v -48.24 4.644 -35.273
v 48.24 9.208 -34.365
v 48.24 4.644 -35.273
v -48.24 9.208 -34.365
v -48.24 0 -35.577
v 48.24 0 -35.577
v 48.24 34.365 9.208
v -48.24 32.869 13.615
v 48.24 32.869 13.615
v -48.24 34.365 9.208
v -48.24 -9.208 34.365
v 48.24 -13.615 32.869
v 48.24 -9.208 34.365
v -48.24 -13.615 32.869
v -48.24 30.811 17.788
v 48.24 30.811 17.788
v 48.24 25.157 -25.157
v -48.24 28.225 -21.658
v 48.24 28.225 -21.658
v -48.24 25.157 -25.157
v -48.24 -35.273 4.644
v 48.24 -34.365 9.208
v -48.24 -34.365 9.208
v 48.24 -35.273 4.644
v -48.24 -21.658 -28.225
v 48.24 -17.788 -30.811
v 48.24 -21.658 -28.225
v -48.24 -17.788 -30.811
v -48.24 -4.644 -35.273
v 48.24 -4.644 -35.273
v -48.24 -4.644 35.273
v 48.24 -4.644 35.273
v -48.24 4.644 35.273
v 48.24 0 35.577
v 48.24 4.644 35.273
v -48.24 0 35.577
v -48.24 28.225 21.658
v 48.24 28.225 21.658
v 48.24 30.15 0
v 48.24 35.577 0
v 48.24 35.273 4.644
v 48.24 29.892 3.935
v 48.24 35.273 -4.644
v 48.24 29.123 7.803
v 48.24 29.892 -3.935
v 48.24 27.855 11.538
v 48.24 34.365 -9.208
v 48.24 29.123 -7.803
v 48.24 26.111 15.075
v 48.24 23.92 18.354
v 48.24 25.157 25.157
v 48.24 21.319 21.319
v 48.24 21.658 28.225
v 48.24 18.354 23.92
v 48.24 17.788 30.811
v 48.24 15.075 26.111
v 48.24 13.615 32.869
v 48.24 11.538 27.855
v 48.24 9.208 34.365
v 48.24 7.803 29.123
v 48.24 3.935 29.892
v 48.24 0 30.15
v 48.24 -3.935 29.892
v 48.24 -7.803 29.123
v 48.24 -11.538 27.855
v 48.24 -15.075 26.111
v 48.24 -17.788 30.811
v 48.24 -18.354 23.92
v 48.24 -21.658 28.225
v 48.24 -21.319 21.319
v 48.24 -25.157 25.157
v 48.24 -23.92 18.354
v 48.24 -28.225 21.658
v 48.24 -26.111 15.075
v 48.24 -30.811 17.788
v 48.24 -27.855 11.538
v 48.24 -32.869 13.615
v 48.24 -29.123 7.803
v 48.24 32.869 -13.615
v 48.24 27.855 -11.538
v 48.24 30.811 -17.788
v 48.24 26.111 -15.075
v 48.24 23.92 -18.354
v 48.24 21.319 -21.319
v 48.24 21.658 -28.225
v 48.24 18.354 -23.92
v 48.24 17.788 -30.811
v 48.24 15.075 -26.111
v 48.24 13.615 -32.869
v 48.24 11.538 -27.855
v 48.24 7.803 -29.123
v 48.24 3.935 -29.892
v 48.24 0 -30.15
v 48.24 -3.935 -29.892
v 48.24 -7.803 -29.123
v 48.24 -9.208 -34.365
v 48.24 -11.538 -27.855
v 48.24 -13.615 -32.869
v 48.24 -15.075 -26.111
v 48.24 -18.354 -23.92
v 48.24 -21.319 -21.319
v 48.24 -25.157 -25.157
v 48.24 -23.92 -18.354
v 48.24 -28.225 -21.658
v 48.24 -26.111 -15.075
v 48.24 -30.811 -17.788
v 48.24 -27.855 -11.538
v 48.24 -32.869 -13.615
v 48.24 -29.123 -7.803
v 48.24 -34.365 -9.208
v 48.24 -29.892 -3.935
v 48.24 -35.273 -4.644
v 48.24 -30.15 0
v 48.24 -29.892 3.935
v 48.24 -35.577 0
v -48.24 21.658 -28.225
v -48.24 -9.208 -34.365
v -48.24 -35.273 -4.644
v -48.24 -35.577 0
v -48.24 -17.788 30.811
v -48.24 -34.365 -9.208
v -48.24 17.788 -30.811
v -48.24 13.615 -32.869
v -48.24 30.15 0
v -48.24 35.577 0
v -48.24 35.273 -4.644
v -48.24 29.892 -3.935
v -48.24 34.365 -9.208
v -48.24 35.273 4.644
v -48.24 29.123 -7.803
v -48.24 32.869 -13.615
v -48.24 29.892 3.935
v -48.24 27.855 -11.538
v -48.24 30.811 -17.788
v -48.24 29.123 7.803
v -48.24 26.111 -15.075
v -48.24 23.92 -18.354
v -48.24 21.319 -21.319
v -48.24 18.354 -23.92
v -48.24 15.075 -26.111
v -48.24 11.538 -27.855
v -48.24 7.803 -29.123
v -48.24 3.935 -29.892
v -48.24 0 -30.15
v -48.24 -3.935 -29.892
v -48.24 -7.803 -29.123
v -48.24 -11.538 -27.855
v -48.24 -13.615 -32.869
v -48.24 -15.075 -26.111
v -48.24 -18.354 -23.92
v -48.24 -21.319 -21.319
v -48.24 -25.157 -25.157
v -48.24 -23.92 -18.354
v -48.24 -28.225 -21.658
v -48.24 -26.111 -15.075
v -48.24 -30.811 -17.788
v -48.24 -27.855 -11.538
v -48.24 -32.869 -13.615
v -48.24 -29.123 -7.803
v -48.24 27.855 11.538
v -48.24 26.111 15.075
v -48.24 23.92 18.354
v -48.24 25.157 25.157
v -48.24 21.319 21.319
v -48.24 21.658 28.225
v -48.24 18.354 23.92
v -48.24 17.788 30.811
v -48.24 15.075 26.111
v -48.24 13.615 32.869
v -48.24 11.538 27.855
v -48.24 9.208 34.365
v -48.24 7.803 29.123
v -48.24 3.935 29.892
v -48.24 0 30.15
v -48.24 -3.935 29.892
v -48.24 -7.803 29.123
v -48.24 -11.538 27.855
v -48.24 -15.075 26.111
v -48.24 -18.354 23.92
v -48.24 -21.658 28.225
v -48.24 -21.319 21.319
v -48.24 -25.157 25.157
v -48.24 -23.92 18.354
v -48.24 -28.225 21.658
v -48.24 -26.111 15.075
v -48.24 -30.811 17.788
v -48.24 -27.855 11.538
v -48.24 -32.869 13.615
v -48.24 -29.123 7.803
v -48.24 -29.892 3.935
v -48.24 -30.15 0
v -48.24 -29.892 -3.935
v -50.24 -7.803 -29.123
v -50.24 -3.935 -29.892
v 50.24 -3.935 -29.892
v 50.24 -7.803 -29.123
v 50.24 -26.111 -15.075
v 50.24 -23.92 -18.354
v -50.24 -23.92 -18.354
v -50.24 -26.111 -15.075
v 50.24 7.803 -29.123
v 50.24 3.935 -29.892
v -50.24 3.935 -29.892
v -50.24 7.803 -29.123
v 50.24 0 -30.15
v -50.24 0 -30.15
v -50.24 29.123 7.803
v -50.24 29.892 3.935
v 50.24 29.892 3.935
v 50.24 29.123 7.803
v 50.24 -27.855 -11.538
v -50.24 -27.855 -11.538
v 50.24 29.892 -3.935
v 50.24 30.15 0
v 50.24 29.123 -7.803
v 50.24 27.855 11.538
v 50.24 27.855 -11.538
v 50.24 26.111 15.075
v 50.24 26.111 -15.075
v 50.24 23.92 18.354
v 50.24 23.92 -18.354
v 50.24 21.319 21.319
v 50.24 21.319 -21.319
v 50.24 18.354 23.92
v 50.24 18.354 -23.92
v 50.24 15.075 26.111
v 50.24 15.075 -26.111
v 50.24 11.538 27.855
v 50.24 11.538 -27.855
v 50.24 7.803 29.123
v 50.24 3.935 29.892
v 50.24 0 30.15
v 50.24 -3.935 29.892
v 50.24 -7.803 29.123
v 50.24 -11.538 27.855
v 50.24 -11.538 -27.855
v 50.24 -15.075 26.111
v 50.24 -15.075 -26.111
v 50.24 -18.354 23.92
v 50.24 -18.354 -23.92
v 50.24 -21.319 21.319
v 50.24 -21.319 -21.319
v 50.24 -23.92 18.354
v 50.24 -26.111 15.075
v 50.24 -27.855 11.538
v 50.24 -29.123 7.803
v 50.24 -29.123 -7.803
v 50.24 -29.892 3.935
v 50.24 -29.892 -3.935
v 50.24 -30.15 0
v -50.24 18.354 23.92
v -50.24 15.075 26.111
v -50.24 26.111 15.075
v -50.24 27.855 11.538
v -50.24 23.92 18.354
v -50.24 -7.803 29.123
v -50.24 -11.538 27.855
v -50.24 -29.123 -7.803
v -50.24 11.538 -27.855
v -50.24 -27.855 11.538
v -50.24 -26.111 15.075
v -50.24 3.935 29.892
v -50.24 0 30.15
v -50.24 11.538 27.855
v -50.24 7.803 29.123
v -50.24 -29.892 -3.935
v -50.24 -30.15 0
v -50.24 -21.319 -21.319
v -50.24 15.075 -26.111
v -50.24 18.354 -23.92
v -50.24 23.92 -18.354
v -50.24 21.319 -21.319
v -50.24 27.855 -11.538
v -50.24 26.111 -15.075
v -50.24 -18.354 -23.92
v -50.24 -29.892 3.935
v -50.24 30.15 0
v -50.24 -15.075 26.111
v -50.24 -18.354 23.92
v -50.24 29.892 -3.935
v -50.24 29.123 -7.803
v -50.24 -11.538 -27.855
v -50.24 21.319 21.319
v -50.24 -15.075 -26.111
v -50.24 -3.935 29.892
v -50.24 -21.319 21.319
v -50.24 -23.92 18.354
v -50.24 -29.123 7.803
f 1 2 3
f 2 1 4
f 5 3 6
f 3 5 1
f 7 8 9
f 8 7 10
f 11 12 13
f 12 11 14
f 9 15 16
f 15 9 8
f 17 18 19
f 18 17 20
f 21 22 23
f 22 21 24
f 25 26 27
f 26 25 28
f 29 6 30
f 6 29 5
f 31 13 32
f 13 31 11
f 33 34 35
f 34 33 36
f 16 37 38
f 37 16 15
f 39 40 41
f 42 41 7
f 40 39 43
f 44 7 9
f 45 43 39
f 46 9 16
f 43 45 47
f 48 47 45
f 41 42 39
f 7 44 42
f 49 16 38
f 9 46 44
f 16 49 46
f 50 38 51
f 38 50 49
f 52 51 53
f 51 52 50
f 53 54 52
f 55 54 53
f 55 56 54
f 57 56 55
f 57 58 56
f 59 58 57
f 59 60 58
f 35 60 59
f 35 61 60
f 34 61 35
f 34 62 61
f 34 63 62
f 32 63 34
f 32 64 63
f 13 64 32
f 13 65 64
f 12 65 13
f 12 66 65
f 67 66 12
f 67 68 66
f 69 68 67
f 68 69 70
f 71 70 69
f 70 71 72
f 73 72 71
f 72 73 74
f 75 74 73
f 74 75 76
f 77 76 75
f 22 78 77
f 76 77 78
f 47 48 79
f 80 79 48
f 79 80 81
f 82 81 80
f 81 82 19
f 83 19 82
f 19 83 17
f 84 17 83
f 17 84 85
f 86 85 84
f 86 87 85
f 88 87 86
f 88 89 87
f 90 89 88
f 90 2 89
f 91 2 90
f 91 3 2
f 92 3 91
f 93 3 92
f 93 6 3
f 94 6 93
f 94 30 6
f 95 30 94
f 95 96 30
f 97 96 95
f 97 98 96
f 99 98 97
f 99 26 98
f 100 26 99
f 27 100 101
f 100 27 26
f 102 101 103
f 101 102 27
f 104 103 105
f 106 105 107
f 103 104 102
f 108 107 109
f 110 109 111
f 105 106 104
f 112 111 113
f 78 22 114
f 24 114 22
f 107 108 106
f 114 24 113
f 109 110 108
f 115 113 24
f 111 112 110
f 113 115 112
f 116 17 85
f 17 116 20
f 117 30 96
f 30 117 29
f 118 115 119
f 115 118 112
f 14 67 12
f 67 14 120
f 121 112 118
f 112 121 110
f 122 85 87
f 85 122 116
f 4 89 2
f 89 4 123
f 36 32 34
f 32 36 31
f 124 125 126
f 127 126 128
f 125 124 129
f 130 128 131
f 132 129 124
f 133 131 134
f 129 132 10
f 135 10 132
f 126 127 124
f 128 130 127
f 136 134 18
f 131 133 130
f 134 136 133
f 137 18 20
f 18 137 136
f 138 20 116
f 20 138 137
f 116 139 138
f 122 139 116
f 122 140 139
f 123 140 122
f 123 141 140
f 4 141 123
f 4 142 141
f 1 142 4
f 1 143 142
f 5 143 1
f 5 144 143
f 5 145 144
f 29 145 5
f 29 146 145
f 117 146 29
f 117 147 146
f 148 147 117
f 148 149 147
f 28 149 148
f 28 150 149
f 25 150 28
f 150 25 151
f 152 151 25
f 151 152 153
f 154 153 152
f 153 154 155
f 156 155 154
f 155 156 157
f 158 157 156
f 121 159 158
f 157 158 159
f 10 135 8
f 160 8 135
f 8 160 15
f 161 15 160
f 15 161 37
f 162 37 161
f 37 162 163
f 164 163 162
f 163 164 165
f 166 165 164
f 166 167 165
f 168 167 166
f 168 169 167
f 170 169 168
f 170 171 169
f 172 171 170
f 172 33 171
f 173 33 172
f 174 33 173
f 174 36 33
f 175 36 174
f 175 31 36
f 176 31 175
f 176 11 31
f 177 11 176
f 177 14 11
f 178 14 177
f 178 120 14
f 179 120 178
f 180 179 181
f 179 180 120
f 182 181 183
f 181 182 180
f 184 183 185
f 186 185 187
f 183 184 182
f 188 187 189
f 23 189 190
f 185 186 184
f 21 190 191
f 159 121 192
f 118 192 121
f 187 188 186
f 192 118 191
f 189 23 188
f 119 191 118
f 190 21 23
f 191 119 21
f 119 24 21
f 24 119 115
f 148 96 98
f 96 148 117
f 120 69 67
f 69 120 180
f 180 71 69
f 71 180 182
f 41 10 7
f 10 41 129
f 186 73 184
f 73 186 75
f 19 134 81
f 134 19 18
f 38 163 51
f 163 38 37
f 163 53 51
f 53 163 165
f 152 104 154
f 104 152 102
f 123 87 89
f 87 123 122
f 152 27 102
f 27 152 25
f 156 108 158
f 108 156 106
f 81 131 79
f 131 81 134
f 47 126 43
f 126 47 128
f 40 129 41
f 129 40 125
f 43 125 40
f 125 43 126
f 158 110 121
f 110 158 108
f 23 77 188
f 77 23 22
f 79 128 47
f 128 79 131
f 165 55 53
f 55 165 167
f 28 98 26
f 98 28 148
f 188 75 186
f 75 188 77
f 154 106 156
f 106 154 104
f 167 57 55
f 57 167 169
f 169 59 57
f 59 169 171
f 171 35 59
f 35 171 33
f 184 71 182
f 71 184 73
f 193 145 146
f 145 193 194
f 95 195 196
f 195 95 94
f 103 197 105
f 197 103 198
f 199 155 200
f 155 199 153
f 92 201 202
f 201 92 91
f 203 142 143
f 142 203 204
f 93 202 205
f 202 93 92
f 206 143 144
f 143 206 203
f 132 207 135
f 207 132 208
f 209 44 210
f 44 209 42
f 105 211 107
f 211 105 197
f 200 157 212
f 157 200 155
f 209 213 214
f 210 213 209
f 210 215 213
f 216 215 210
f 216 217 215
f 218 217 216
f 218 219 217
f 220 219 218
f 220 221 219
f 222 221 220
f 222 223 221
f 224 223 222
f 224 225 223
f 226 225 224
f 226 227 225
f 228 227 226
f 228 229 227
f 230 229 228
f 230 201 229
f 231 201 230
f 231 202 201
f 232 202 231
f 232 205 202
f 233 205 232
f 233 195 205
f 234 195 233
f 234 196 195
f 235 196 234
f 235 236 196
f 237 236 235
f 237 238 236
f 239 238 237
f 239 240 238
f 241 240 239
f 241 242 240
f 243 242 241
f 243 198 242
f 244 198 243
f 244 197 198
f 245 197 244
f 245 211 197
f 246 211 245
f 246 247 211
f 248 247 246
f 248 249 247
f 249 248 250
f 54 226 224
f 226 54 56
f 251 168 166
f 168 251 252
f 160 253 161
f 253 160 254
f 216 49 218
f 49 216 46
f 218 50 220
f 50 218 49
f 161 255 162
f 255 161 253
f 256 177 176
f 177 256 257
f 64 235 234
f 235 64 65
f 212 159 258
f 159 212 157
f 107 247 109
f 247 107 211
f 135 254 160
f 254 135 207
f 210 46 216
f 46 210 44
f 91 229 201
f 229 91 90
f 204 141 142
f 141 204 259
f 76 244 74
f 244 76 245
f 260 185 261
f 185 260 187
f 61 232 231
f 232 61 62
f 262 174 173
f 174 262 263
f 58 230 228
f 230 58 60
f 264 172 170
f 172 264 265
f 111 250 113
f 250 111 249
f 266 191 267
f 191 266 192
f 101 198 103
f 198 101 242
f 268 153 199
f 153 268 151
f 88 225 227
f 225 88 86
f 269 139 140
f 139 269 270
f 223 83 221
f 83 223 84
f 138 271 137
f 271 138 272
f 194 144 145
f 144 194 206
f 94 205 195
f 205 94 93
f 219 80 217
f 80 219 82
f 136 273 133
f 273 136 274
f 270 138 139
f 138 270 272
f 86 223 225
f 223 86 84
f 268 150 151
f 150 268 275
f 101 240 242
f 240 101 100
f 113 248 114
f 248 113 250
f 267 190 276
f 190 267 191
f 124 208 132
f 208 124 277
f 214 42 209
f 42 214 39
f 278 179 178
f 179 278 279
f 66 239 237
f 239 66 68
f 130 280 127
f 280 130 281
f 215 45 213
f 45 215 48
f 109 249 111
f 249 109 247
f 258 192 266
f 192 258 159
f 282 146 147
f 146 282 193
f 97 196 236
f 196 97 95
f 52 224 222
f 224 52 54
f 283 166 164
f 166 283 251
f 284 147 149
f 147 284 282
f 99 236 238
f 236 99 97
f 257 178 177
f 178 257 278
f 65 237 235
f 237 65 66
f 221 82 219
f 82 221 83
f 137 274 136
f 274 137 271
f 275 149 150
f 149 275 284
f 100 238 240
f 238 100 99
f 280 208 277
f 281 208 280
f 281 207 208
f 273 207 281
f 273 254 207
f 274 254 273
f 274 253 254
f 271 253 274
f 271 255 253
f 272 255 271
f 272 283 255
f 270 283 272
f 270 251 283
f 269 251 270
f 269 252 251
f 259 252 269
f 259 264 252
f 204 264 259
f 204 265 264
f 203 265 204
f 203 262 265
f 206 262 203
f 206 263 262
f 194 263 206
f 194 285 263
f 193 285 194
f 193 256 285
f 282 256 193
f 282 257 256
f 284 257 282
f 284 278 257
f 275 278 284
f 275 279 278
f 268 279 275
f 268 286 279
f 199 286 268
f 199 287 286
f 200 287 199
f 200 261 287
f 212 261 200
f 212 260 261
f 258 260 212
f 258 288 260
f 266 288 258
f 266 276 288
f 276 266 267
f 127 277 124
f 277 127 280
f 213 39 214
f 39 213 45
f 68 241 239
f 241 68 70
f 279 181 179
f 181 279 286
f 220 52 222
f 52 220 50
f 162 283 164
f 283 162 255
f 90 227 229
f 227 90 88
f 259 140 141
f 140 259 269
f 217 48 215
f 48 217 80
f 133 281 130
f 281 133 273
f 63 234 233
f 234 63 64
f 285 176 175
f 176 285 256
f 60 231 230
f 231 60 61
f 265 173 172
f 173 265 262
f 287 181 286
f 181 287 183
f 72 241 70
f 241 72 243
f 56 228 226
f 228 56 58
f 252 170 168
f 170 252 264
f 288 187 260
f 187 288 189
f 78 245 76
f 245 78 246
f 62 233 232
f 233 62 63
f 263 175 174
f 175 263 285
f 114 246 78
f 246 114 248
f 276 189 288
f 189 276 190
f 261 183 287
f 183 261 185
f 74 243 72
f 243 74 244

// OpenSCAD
// Grooved coupling — symmetric. Ends at ±X, origin at center.
size_in = 2;

function od_mm(nps) =
    nps ==   1  ? 33.4 :
    nps == 1.25 ? 42.2 :
    nps == 1.5  ? 48.3 :
    nps ==   2  ? 60.3 :
    nps == 2.5  ? 73.0 :
    nps ==   3  ? 88.9 :
    nps ==   4  ? 114.3 :
    nps ==   5  ? 141.3 :
    nps ==   6  ? 168.3 :
    nps ==   8  ? 219.1 :
    nps ==  10  ? 273.0 : 60.3;

od = od_mm(size_in);
len_mm = od * 1.6;

rotate([0, 90, 0])
    union() {
        cylinder(h = len_mm, d = od * 1.18, center = true, $fn = 48);
        cylinder(h = len_mm + 4, d = od, center = true, $fn = 48);
    }
